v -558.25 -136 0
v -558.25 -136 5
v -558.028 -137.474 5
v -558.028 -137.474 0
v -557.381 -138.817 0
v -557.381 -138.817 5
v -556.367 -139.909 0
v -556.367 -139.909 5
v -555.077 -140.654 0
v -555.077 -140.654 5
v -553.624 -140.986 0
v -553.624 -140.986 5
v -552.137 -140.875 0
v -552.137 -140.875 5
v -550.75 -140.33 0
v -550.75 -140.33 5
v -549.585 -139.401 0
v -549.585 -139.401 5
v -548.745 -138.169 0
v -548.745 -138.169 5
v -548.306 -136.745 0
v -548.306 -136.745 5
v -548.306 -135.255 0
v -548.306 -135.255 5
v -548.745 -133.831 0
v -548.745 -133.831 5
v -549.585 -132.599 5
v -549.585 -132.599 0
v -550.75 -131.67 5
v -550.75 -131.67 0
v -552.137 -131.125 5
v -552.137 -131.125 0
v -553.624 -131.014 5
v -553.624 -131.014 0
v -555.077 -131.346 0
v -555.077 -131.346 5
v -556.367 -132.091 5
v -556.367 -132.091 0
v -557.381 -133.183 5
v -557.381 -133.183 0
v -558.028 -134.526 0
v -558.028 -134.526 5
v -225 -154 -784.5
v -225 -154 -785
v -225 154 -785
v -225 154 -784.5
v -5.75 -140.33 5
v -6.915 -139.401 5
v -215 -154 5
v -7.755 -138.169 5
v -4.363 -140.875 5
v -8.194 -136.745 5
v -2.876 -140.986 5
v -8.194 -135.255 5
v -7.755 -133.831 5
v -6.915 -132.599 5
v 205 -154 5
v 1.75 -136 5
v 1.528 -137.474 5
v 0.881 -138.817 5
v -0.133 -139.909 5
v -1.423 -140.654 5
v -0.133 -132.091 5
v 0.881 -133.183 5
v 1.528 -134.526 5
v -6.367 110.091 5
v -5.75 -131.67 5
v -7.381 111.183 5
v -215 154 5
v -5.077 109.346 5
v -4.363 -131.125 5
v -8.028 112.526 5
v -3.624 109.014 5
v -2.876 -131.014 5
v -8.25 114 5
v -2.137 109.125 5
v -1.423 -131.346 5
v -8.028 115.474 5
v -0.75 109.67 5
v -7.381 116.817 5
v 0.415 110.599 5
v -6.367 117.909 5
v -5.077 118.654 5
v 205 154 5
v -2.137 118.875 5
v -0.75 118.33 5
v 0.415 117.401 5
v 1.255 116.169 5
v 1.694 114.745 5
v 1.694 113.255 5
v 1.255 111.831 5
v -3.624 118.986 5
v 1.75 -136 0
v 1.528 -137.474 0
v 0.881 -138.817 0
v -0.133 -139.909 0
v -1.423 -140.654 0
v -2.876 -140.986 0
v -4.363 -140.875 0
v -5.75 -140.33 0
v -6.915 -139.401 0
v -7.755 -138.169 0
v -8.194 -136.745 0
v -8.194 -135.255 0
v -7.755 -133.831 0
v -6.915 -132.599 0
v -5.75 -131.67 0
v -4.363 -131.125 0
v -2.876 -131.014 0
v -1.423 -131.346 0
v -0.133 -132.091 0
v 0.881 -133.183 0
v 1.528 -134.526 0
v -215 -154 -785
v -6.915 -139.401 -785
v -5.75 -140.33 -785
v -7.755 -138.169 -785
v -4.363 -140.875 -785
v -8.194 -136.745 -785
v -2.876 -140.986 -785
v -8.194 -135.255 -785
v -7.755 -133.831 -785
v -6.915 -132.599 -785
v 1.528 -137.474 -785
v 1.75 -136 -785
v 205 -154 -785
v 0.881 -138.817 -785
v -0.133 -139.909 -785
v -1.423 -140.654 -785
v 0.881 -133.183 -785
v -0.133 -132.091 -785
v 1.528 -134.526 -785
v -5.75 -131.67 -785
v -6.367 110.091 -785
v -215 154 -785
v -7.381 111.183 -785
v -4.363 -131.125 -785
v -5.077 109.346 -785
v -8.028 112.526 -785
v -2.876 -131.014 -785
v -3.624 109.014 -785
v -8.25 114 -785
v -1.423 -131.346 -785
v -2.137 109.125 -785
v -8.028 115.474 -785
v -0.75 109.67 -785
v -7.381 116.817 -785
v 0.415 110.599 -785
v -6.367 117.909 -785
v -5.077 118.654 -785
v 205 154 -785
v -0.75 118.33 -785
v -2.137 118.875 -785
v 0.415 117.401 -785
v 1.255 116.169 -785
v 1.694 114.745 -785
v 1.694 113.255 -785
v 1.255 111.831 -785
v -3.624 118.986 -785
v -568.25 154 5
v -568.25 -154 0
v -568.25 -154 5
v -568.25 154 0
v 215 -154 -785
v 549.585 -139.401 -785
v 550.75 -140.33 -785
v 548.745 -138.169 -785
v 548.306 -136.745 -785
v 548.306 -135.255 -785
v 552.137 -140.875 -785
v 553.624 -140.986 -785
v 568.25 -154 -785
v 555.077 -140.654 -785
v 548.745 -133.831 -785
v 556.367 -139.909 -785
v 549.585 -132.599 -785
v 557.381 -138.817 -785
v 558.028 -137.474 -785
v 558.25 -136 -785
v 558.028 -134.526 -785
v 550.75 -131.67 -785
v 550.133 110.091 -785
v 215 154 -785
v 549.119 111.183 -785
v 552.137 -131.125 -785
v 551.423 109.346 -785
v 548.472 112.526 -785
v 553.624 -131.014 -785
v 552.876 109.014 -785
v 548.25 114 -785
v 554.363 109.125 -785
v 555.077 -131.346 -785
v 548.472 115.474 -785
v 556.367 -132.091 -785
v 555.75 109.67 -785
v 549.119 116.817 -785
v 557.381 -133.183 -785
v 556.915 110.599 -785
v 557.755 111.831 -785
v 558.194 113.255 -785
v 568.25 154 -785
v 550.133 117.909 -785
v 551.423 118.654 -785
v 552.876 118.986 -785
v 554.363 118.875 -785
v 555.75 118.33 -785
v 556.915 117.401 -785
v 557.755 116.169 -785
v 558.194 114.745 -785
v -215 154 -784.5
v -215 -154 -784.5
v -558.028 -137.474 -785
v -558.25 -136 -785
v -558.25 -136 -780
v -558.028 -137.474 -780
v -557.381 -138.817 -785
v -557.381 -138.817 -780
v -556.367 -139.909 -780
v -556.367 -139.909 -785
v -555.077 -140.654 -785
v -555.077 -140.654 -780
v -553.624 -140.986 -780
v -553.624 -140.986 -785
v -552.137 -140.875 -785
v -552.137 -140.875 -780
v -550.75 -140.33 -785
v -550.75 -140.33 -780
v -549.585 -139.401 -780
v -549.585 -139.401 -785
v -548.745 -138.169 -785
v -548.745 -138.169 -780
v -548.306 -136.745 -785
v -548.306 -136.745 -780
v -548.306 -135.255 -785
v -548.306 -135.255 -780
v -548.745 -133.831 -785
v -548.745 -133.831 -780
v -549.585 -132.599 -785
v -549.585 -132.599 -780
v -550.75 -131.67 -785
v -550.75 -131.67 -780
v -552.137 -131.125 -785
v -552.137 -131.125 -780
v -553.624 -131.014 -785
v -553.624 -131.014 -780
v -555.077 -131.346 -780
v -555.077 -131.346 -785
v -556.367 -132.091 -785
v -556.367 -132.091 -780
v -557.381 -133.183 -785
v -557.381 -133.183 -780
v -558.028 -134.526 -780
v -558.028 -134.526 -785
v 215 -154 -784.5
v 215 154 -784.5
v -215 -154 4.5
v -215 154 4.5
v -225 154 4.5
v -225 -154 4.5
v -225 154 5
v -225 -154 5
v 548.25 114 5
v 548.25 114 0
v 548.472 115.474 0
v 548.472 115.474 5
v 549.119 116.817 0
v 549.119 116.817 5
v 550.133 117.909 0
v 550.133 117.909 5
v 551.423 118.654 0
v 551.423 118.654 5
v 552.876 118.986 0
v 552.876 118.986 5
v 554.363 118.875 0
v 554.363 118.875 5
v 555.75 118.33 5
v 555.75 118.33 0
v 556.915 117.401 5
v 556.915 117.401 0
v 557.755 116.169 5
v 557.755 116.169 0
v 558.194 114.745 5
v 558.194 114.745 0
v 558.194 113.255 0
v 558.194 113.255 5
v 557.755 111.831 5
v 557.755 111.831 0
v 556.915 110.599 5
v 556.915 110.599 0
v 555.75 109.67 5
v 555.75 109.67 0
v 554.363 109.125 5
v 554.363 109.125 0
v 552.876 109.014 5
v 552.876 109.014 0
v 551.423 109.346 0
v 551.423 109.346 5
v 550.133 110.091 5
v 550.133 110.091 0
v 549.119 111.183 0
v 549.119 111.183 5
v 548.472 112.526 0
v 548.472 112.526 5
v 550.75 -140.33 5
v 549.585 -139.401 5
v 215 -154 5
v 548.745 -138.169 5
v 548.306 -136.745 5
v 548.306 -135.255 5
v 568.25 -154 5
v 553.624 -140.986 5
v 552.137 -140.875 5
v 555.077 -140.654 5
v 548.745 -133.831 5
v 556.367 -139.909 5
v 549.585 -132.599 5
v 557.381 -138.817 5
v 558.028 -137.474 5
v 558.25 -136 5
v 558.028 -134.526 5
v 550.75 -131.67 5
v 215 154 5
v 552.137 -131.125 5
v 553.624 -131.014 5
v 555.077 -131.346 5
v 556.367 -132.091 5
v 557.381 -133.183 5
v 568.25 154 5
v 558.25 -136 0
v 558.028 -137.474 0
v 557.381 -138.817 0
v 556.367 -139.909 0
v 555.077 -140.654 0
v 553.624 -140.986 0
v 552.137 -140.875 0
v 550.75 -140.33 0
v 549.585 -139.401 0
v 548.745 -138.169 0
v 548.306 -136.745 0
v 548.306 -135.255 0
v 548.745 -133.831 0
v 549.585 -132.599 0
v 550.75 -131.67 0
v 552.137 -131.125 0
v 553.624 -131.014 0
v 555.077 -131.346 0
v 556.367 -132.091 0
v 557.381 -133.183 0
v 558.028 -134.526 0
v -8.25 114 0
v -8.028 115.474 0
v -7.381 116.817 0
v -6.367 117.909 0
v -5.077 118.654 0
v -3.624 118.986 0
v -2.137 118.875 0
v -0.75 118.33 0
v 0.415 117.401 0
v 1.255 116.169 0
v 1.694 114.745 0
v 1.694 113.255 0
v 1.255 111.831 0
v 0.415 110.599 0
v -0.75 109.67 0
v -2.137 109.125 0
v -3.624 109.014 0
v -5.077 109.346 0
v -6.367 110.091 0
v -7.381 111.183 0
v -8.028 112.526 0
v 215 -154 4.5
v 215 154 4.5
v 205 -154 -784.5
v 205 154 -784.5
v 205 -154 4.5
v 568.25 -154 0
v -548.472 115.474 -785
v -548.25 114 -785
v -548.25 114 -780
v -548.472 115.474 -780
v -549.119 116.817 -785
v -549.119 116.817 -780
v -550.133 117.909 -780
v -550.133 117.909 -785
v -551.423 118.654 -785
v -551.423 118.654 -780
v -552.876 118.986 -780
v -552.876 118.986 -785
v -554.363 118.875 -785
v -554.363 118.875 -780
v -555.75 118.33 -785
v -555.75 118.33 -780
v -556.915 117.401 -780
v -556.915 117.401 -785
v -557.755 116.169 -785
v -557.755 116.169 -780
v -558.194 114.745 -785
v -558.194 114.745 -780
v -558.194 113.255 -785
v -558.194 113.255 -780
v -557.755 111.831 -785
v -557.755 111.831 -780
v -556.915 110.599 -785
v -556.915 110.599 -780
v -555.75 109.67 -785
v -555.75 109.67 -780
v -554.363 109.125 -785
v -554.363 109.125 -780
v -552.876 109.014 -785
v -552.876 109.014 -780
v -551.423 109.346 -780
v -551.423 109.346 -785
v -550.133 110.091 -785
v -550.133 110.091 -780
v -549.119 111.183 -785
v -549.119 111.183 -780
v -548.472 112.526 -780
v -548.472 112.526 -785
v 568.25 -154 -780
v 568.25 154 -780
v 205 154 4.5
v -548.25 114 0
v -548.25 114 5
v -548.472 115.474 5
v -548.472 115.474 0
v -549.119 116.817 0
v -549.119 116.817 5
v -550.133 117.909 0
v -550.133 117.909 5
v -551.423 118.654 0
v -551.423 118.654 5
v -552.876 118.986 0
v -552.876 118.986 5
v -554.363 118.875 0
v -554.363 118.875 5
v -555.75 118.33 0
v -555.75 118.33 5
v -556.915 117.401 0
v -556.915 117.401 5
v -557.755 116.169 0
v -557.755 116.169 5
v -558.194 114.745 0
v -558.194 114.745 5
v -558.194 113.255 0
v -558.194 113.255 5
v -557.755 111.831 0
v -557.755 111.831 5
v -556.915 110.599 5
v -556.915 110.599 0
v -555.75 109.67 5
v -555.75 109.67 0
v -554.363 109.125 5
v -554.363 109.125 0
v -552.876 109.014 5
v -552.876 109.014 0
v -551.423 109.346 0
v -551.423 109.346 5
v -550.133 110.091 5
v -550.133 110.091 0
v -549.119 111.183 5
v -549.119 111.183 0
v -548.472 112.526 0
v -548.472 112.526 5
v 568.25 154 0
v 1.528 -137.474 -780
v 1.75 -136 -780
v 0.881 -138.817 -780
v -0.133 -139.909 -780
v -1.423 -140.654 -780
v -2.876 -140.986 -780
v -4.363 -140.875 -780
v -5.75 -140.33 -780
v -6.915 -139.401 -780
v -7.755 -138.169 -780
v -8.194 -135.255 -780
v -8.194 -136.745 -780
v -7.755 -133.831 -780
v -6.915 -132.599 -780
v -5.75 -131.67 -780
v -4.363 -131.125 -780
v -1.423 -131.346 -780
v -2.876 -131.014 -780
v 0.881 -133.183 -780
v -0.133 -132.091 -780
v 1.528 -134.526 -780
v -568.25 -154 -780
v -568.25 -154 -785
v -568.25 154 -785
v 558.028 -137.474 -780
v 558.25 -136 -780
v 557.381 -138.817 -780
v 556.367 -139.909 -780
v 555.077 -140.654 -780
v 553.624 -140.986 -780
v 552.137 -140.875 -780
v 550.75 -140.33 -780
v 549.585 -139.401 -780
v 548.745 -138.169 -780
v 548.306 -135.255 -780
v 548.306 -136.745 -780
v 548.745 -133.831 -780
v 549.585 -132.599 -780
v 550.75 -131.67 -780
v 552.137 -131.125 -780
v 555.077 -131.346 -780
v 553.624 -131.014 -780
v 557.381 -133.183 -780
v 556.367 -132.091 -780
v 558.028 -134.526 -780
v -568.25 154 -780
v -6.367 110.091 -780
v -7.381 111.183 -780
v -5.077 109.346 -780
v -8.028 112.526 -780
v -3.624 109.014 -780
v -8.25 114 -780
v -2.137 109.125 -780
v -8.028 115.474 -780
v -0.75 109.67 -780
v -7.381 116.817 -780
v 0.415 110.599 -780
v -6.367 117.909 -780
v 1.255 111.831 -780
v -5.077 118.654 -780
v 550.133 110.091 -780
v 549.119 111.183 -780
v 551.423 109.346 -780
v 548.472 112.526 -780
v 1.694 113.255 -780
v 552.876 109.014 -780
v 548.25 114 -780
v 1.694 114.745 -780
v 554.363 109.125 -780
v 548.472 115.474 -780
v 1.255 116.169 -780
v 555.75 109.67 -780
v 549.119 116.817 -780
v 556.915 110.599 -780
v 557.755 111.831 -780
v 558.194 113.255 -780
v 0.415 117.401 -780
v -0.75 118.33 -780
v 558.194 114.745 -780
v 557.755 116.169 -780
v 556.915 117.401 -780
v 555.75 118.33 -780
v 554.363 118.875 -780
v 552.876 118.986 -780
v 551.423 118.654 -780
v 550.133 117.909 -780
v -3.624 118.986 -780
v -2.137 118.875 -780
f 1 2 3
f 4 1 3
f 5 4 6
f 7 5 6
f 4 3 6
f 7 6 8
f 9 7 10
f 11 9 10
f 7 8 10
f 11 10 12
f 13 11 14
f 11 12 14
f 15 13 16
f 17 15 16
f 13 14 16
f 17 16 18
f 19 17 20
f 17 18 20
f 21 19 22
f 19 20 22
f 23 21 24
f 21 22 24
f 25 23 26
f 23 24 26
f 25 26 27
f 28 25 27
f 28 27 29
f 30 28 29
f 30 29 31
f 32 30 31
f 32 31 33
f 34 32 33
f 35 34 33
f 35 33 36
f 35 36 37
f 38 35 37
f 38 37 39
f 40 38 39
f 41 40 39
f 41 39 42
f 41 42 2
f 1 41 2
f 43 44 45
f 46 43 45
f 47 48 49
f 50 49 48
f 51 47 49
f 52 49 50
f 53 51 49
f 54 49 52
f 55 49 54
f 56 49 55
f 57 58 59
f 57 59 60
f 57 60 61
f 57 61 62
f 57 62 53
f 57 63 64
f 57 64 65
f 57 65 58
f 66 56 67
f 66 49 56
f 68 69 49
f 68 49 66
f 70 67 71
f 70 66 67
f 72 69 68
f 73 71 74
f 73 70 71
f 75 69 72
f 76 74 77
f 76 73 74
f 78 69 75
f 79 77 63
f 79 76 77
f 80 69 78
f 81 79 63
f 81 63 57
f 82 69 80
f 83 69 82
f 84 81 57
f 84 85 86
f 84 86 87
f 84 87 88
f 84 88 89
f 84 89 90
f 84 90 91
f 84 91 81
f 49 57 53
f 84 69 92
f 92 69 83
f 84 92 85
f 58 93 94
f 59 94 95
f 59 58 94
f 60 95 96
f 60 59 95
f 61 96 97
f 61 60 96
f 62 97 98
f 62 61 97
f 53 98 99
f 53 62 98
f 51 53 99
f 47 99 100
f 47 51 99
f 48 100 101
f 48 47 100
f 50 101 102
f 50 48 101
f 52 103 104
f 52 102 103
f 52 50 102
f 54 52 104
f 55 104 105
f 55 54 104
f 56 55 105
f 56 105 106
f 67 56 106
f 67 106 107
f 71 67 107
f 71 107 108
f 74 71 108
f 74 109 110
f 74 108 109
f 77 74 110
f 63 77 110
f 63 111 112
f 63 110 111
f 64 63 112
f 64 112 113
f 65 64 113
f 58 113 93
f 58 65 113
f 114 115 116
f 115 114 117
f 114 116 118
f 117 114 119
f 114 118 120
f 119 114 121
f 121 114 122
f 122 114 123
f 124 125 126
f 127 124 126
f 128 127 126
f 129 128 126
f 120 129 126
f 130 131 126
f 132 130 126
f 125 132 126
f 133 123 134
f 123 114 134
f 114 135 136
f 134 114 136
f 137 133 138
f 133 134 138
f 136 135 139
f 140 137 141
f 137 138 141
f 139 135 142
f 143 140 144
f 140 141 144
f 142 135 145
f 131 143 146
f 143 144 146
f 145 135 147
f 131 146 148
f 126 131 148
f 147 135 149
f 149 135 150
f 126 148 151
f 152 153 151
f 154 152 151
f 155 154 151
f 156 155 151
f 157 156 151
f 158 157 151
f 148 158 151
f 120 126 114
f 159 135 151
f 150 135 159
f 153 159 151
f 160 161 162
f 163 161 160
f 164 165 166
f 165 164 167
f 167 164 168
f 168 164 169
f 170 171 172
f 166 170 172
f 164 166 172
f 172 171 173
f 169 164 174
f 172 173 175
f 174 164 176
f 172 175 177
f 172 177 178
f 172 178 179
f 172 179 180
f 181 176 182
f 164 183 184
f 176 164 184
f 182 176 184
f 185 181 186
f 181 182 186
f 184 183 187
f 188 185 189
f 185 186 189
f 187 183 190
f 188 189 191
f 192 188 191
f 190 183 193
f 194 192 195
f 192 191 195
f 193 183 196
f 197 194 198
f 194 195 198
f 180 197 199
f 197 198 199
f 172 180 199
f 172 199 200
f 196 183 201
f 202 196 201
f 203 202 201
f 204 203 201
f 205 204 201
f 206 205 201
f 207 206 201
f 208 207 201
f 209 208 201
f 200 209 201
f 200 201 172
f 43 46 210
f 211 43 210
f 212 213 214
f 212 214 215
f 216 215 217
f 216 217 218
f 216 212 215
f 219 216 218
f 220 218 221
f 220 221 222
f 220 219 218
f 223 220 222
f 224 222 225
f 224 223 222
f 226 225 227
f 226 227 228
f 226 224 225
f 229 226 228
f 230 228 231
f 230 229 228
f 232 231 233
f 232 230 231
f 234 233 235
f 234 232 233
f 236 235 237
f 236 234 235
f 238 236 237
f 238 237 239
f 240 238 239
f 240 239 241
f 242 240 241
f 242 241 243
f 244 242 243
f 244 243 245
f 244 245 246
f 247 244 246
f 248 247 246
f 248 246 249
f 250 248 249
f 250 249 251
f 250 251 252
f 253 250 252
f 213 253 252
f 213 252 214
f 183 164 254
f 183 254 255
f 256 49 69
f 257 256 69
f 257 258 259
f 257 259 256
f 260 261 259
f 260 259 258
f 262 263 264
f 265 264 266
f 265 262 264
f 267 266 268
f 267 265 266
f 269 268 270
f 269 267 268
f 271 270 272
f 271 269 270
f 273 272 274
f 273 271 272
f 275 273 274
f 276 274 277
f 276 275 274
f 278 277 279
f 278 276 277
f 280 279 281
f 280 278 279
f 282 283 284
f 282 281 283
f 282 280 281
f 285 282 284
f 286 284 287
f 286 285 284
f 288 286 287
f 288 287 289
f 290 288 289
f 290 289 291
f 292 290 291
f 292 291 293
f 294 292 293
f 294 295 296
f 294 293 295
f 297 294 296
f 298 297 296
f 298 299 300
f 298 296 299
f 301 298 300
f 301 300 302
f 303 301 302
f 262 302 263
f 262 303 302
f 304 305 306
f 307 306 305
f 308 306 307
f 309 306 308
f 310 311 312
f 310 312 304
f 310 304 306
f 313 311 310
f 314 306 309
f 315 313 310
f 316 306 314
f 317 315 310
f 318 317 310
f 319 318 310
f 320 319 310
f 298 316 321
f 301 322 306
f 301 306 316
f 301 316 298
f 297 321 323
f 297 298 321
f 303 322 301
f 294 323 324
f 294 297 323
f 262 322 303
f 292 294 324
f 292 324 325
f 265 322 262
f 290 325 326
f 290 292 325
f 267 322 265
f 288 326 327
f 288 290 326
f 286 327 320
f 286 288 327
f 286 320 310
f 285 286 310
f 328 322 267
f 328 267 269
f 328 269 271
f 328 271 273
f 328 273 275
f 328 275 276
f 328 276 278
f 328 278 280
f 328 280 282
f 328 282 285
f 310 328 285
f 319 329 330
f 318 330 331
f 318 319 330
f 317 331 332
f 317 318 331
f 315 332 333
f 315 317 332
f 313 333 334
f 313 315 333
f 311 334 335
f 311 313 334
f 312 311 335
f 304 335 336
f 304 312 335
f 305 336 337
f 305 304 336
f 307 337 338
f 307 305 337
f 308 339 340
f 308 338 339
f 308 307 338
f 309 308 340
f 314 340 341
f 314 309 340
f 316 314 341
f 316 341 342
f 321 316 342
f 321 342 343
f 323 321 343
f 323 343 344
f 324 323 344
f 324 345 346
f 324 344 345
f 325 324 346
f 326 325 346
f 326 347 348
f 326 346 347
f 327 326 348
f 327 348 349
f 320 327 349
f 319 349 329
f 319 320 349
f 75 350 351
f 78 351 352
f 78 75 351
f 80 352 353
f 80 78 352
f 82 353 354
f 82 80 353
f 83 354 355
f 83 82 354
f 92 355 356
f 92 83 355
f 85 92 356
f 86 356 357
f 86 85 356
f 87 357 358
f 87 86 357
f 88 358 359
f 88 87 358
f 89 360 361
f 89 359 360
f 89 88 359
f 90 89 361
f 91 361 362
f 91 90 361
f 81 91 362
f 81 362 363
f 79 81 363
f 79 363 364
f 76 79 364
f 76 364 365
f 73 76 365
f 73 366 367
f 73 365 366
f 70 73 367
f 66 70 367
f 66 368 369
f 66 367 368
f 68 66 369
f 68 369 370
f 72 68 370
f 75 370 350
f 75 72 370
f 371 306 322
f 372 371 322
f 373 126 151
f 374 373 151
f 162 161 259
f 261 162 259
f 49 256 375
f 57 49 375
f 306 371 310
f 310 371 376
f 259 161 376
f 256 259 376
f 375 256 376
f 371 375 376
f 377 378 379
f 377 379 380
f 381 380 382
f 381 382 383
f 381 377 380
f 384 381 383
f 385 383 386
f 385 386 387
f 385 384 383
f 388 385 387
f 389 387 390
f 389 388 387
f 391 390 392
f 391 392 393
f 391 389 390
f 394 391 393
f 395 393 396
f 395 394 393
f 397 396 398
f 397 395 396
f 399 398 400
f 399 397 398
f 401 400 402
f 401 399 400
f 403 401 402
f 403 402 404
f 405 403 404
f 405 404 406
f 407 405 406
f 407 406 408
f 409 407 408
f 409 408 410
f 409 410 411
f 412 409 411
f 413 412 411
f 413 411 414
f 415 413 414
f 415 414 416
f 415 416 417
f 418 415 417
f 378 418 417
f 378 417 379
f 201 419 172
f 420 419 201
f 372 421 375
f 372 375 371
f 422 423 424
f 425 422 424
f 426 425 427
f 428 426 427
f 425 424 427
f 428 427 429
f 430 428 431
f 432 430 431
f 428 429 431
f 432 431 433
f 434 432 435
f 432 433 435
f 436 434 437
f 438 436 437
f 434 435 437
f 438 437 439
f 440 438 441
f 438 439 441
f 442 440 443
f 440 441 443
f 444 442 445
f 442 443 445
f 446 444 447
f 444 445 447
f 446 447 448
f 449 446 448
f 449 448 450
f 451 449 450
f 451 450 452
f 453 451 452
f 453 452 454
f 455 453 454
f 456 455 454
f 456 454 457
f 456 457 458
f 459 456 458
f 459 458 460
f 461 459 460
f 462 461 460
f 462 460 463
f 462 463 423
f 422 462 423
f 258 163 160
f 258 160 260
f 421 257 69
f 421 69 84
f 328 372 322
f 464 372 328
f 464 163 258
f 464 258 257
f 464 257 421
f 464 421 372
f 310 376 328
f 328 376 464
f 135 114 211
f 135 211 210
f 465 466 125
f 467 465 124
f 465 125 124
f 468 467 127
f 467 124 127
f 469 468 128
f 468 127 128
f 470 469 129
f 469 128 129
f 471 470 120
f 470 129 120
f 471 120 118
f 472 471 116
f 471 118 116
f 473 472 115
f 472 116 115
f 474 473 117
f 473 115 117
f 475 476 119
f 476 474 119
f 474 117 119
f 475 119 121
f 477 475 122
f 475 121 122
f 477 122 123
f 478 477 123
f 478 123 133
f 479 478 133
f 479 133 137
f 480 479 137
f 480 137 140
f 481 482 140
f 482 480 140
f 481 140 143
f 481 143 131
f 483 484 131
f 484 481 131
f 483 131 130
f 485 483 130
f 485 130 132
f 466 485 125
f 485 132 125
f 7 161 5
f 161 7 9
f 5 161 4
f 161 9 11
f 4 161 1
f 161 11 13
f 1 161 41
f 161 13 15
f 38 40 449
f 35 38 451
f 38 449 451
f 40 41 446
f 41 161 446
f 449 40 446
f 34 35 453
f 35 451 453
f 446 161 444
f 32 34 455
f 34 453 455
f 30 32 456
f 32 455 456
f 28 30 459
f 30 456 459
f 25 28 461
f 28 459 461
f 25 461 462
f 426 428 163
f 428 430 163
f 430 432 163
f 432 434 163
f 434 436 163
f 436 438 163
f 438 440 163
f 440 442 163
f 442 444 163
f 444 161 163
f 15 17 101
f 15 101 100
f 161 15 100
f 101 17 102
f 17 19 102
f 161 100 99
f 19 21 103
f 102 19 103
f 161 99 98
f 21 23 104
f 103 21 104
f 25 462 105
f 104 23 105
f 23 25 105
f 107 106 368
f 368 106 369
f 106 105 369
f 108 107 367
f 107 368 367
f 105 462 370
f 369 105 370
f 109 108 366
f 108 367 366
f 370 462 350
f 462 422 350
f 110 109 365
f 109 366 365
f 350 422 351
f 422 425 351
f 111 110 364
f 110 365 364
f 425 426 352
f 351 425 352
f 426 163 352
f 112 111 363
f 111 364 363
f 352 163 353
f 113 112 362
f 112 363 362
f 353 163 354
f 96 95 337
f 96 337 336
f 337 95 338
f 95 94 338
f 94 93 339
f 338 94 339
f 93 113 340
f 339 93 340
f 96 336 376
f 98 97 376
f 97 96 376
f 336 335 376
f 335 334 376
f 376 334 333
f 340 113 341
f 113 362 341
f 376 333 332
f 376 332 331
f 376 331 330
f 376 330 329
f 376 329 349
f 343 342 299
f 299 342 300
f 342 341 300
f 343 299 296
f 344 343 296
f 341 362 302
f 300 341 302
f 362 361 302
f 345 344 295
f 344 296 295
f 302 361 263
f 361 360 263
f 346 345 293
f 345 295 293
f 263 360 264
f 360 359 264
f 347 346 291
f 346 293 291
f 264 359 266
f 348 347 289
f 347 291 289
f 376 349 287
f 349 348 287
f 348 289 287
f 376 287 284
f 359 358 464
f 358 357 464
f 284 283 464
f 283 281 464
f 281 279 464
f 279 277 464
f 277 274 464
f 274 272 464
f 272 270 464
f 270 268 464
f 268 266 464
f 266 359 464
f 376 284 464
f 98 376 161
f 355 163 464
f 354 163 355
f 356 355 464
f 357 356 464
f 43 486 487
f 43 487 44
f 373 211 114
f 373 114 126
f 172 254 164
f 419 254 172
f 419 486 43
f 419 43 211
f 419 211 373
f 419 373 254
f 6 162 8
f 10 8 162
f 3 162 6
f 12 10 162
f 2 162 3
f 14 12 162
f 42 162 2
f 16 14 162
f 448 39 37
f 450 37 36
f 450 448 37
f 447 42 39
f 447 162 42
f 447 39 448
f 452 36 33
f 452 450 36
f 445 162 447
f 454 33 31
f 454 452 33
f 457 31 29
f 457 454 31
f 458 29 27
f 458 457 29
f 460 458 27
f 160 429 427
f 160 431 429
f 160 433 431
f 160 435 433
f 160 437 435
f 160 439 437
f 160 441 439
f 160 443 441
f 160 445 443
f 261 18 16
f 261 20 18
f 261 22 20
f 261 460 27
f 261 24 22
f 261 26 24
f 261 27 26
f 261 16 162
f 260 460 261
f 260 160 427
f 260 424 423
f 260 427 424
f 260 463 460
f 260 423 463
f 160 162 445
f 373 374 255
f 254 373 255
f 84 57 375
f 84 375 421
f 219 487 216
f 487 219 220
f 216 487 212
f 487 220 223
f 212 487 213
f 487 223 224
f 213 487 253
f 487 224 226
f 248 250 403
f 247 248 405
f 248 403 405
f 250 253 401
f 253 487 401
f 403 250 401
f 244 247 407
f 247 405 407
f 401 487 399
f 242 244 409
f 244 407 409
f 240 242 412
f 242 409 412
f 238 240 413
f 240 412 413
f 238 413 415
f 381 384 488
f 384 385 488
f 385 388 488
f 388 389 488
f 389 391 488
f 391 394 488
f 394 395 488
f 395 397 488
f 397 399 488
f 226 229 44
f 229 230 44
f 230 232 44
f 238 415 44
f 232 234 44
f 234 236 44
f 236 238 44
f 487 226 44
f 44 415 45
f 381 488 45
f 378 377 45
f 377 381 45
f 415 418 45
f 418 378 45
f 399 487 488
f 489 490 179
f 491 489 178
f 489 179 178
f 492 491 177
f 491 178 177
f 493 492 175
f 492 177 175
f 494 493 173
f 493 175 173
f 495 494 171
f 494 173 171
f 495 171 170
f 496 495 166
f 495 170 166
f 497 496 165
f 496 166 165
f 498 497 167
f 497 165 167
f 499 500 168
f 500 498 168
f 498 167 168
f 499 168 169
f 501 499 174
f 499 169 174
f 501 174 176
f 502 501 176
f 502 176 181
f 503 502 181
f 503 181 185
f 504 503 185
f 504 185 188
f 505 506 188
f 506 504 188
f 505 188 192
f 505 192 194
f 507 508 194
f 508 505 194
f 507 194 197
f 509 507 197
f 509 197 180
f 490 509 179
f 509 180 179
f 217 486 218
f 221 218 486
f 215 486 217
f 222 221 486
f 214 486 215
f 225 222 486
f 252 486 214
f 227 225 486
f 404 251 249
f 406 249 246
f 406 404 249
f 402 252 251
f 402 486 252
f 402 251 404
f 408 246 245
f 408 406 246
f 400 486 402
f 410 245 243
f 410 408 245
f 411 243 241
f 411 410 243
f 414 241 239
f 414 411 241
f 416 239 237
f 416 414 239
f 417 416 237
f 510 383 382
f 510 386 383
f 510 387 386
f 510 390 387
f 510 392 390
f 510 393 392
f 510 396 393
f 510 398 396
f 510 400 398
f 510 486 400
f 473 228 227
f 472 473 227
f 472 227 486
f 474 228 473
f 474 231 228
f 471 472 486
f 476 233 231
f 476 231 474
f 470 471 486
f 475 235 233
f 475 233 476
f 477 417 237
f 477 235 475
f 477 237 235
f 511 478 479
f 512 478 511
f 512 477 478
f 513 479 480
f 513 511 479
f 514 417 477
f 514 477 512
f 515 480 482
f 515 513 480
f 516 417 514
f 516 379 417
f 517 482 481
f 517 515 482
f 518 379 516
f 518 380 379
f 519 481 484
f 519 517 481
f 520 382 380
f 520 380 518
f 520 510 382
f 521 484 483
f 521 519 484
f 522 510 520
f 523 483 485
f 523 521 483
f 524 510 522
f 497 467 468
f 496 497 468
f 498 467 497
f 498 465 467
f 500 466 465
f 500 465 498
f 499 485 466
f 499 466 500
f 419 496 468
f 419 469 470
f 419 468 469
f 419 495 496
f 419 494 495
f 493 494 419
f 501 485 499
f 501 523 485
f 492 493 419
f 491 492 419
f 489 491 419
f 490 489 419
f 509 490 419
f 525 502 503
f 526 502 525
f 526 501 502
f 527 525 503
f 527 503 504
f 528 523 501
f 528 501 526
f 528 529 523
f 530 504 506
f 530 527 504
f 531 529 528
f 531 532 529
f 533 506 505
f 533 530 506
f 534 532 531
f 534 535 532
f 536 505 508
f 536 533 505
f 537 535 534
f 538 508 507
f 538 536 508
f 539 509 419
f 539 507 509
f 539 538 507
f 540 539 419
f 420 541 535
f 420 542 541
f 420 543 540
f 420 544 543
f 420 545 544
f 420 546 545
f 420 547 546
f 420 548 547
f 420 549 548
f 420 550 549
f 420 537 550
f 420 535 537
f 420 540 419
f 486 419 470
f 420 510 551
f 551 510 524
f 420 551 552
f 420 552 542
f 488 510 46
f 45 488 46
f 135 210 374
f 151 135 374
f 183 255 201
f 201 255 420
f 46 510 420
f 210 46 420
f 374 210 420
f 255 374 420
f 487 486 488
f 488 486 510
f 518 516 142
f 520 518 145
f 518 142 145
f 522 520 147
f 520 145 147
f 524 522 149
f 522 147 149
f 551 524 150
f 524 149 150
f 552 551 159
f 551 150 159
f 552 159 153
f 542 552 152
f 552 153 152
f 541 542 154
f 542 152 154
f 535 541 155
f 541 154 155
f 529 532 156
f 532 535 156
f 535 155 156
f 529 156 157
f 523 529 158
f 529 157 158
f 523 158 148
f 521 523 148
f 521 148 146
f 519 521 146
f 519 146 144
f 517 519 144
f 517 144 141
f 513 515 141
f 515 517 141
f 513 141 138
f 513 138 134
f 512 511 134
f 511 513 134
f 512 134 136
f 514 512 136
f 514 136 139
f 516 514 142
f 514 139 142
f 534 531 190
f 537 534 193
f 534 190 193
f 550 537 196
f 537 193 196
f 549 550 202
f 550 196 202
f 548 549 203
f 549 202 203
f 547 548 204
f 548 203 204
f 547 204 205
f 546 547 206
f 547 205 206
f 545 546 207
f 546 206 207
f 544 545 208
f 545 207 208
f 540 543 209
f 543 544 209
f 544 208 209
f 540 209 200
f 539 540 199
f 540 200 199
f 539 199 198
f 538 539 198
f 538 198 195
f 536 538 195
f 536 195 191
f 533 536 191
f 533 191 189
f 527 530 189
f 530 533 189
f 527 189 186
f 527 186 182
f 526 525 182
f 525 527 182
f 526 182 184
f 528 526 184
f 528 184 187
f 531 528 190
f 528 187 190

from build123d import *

# Parameters (mm, degrees)
SKETCH1_W               = 1136.5
SKETCH1_H               = 308
BOSS_EXTRUDE1_DEPTH     = 5
SKETCH2_W               = 10
SKETCH2_H               = 308
CUT_EXTRUDE_THIN1_DEPTH = 0.5
SKETCH3_R               = 5
CUT_EXTRUDE1_DEPTH      = 589.76910797


with BuildPart() as part:
    # Sketch1 → Boss-Extrude1 (new body)
    with BuildSketch(Plane.XY):
        Rectangle(SKETCH1_W, SKETCH1_H)
    extrude(amount=BOSS_EXTRUDE1_DEPTH)

    # Sketch2 → Cut-Extrude-Thin1 (cut)
    with BuildSketch(Plane.XY.offset(5)):
        with Locations((-220, 0)):
            Rectangle(SKETCH2_W, SKETCH2_H)
        with Locations((210, 0)):
            Rectangle(SKETCH2_W, SKETCH2_H)
    extrude(amount=-CUT_EXTRUDE_THIN1_DEPTH, mode=Mode.SUBTRACT)

    # Sketch3 → Cut-Extrude1 (cut, through all)
    with BuildSketch(Plane.XY.offset(5)):
        with Locations((-553.25, 114)):
            Circle(SKETCH3_R)
        with Locations(Location((-553.25, -136, 0), (0, 0, 180))):
            Circle(SKETCH3_R)
    cut_extrude1 = extrude(amount=-CUT_EXTRUDE1_DEPTH, mode=Mode.SUBTRACT)

    # Mirror3: Cut-Extrude1 across plane
    add(cut_extrude1.mirror(Plane.ZY.offset(278.25)), mode=Mode.SUBTRACT)

    # Mirror4: Cut-Extrude1 across plane
    add(cut_extrude1.mirror(Plane.ZY), mode=Mode.SUBTRACT)


with BuildPart() as body_2:
    # Mirror6: mirrored copy
    add(part.part.mirror(Plane(origin=(0, 0, -390), x_dir=(1, 0, 0), z_dir=(0, 0, -1))))


solid = Compound([part.part, body_2.part])
